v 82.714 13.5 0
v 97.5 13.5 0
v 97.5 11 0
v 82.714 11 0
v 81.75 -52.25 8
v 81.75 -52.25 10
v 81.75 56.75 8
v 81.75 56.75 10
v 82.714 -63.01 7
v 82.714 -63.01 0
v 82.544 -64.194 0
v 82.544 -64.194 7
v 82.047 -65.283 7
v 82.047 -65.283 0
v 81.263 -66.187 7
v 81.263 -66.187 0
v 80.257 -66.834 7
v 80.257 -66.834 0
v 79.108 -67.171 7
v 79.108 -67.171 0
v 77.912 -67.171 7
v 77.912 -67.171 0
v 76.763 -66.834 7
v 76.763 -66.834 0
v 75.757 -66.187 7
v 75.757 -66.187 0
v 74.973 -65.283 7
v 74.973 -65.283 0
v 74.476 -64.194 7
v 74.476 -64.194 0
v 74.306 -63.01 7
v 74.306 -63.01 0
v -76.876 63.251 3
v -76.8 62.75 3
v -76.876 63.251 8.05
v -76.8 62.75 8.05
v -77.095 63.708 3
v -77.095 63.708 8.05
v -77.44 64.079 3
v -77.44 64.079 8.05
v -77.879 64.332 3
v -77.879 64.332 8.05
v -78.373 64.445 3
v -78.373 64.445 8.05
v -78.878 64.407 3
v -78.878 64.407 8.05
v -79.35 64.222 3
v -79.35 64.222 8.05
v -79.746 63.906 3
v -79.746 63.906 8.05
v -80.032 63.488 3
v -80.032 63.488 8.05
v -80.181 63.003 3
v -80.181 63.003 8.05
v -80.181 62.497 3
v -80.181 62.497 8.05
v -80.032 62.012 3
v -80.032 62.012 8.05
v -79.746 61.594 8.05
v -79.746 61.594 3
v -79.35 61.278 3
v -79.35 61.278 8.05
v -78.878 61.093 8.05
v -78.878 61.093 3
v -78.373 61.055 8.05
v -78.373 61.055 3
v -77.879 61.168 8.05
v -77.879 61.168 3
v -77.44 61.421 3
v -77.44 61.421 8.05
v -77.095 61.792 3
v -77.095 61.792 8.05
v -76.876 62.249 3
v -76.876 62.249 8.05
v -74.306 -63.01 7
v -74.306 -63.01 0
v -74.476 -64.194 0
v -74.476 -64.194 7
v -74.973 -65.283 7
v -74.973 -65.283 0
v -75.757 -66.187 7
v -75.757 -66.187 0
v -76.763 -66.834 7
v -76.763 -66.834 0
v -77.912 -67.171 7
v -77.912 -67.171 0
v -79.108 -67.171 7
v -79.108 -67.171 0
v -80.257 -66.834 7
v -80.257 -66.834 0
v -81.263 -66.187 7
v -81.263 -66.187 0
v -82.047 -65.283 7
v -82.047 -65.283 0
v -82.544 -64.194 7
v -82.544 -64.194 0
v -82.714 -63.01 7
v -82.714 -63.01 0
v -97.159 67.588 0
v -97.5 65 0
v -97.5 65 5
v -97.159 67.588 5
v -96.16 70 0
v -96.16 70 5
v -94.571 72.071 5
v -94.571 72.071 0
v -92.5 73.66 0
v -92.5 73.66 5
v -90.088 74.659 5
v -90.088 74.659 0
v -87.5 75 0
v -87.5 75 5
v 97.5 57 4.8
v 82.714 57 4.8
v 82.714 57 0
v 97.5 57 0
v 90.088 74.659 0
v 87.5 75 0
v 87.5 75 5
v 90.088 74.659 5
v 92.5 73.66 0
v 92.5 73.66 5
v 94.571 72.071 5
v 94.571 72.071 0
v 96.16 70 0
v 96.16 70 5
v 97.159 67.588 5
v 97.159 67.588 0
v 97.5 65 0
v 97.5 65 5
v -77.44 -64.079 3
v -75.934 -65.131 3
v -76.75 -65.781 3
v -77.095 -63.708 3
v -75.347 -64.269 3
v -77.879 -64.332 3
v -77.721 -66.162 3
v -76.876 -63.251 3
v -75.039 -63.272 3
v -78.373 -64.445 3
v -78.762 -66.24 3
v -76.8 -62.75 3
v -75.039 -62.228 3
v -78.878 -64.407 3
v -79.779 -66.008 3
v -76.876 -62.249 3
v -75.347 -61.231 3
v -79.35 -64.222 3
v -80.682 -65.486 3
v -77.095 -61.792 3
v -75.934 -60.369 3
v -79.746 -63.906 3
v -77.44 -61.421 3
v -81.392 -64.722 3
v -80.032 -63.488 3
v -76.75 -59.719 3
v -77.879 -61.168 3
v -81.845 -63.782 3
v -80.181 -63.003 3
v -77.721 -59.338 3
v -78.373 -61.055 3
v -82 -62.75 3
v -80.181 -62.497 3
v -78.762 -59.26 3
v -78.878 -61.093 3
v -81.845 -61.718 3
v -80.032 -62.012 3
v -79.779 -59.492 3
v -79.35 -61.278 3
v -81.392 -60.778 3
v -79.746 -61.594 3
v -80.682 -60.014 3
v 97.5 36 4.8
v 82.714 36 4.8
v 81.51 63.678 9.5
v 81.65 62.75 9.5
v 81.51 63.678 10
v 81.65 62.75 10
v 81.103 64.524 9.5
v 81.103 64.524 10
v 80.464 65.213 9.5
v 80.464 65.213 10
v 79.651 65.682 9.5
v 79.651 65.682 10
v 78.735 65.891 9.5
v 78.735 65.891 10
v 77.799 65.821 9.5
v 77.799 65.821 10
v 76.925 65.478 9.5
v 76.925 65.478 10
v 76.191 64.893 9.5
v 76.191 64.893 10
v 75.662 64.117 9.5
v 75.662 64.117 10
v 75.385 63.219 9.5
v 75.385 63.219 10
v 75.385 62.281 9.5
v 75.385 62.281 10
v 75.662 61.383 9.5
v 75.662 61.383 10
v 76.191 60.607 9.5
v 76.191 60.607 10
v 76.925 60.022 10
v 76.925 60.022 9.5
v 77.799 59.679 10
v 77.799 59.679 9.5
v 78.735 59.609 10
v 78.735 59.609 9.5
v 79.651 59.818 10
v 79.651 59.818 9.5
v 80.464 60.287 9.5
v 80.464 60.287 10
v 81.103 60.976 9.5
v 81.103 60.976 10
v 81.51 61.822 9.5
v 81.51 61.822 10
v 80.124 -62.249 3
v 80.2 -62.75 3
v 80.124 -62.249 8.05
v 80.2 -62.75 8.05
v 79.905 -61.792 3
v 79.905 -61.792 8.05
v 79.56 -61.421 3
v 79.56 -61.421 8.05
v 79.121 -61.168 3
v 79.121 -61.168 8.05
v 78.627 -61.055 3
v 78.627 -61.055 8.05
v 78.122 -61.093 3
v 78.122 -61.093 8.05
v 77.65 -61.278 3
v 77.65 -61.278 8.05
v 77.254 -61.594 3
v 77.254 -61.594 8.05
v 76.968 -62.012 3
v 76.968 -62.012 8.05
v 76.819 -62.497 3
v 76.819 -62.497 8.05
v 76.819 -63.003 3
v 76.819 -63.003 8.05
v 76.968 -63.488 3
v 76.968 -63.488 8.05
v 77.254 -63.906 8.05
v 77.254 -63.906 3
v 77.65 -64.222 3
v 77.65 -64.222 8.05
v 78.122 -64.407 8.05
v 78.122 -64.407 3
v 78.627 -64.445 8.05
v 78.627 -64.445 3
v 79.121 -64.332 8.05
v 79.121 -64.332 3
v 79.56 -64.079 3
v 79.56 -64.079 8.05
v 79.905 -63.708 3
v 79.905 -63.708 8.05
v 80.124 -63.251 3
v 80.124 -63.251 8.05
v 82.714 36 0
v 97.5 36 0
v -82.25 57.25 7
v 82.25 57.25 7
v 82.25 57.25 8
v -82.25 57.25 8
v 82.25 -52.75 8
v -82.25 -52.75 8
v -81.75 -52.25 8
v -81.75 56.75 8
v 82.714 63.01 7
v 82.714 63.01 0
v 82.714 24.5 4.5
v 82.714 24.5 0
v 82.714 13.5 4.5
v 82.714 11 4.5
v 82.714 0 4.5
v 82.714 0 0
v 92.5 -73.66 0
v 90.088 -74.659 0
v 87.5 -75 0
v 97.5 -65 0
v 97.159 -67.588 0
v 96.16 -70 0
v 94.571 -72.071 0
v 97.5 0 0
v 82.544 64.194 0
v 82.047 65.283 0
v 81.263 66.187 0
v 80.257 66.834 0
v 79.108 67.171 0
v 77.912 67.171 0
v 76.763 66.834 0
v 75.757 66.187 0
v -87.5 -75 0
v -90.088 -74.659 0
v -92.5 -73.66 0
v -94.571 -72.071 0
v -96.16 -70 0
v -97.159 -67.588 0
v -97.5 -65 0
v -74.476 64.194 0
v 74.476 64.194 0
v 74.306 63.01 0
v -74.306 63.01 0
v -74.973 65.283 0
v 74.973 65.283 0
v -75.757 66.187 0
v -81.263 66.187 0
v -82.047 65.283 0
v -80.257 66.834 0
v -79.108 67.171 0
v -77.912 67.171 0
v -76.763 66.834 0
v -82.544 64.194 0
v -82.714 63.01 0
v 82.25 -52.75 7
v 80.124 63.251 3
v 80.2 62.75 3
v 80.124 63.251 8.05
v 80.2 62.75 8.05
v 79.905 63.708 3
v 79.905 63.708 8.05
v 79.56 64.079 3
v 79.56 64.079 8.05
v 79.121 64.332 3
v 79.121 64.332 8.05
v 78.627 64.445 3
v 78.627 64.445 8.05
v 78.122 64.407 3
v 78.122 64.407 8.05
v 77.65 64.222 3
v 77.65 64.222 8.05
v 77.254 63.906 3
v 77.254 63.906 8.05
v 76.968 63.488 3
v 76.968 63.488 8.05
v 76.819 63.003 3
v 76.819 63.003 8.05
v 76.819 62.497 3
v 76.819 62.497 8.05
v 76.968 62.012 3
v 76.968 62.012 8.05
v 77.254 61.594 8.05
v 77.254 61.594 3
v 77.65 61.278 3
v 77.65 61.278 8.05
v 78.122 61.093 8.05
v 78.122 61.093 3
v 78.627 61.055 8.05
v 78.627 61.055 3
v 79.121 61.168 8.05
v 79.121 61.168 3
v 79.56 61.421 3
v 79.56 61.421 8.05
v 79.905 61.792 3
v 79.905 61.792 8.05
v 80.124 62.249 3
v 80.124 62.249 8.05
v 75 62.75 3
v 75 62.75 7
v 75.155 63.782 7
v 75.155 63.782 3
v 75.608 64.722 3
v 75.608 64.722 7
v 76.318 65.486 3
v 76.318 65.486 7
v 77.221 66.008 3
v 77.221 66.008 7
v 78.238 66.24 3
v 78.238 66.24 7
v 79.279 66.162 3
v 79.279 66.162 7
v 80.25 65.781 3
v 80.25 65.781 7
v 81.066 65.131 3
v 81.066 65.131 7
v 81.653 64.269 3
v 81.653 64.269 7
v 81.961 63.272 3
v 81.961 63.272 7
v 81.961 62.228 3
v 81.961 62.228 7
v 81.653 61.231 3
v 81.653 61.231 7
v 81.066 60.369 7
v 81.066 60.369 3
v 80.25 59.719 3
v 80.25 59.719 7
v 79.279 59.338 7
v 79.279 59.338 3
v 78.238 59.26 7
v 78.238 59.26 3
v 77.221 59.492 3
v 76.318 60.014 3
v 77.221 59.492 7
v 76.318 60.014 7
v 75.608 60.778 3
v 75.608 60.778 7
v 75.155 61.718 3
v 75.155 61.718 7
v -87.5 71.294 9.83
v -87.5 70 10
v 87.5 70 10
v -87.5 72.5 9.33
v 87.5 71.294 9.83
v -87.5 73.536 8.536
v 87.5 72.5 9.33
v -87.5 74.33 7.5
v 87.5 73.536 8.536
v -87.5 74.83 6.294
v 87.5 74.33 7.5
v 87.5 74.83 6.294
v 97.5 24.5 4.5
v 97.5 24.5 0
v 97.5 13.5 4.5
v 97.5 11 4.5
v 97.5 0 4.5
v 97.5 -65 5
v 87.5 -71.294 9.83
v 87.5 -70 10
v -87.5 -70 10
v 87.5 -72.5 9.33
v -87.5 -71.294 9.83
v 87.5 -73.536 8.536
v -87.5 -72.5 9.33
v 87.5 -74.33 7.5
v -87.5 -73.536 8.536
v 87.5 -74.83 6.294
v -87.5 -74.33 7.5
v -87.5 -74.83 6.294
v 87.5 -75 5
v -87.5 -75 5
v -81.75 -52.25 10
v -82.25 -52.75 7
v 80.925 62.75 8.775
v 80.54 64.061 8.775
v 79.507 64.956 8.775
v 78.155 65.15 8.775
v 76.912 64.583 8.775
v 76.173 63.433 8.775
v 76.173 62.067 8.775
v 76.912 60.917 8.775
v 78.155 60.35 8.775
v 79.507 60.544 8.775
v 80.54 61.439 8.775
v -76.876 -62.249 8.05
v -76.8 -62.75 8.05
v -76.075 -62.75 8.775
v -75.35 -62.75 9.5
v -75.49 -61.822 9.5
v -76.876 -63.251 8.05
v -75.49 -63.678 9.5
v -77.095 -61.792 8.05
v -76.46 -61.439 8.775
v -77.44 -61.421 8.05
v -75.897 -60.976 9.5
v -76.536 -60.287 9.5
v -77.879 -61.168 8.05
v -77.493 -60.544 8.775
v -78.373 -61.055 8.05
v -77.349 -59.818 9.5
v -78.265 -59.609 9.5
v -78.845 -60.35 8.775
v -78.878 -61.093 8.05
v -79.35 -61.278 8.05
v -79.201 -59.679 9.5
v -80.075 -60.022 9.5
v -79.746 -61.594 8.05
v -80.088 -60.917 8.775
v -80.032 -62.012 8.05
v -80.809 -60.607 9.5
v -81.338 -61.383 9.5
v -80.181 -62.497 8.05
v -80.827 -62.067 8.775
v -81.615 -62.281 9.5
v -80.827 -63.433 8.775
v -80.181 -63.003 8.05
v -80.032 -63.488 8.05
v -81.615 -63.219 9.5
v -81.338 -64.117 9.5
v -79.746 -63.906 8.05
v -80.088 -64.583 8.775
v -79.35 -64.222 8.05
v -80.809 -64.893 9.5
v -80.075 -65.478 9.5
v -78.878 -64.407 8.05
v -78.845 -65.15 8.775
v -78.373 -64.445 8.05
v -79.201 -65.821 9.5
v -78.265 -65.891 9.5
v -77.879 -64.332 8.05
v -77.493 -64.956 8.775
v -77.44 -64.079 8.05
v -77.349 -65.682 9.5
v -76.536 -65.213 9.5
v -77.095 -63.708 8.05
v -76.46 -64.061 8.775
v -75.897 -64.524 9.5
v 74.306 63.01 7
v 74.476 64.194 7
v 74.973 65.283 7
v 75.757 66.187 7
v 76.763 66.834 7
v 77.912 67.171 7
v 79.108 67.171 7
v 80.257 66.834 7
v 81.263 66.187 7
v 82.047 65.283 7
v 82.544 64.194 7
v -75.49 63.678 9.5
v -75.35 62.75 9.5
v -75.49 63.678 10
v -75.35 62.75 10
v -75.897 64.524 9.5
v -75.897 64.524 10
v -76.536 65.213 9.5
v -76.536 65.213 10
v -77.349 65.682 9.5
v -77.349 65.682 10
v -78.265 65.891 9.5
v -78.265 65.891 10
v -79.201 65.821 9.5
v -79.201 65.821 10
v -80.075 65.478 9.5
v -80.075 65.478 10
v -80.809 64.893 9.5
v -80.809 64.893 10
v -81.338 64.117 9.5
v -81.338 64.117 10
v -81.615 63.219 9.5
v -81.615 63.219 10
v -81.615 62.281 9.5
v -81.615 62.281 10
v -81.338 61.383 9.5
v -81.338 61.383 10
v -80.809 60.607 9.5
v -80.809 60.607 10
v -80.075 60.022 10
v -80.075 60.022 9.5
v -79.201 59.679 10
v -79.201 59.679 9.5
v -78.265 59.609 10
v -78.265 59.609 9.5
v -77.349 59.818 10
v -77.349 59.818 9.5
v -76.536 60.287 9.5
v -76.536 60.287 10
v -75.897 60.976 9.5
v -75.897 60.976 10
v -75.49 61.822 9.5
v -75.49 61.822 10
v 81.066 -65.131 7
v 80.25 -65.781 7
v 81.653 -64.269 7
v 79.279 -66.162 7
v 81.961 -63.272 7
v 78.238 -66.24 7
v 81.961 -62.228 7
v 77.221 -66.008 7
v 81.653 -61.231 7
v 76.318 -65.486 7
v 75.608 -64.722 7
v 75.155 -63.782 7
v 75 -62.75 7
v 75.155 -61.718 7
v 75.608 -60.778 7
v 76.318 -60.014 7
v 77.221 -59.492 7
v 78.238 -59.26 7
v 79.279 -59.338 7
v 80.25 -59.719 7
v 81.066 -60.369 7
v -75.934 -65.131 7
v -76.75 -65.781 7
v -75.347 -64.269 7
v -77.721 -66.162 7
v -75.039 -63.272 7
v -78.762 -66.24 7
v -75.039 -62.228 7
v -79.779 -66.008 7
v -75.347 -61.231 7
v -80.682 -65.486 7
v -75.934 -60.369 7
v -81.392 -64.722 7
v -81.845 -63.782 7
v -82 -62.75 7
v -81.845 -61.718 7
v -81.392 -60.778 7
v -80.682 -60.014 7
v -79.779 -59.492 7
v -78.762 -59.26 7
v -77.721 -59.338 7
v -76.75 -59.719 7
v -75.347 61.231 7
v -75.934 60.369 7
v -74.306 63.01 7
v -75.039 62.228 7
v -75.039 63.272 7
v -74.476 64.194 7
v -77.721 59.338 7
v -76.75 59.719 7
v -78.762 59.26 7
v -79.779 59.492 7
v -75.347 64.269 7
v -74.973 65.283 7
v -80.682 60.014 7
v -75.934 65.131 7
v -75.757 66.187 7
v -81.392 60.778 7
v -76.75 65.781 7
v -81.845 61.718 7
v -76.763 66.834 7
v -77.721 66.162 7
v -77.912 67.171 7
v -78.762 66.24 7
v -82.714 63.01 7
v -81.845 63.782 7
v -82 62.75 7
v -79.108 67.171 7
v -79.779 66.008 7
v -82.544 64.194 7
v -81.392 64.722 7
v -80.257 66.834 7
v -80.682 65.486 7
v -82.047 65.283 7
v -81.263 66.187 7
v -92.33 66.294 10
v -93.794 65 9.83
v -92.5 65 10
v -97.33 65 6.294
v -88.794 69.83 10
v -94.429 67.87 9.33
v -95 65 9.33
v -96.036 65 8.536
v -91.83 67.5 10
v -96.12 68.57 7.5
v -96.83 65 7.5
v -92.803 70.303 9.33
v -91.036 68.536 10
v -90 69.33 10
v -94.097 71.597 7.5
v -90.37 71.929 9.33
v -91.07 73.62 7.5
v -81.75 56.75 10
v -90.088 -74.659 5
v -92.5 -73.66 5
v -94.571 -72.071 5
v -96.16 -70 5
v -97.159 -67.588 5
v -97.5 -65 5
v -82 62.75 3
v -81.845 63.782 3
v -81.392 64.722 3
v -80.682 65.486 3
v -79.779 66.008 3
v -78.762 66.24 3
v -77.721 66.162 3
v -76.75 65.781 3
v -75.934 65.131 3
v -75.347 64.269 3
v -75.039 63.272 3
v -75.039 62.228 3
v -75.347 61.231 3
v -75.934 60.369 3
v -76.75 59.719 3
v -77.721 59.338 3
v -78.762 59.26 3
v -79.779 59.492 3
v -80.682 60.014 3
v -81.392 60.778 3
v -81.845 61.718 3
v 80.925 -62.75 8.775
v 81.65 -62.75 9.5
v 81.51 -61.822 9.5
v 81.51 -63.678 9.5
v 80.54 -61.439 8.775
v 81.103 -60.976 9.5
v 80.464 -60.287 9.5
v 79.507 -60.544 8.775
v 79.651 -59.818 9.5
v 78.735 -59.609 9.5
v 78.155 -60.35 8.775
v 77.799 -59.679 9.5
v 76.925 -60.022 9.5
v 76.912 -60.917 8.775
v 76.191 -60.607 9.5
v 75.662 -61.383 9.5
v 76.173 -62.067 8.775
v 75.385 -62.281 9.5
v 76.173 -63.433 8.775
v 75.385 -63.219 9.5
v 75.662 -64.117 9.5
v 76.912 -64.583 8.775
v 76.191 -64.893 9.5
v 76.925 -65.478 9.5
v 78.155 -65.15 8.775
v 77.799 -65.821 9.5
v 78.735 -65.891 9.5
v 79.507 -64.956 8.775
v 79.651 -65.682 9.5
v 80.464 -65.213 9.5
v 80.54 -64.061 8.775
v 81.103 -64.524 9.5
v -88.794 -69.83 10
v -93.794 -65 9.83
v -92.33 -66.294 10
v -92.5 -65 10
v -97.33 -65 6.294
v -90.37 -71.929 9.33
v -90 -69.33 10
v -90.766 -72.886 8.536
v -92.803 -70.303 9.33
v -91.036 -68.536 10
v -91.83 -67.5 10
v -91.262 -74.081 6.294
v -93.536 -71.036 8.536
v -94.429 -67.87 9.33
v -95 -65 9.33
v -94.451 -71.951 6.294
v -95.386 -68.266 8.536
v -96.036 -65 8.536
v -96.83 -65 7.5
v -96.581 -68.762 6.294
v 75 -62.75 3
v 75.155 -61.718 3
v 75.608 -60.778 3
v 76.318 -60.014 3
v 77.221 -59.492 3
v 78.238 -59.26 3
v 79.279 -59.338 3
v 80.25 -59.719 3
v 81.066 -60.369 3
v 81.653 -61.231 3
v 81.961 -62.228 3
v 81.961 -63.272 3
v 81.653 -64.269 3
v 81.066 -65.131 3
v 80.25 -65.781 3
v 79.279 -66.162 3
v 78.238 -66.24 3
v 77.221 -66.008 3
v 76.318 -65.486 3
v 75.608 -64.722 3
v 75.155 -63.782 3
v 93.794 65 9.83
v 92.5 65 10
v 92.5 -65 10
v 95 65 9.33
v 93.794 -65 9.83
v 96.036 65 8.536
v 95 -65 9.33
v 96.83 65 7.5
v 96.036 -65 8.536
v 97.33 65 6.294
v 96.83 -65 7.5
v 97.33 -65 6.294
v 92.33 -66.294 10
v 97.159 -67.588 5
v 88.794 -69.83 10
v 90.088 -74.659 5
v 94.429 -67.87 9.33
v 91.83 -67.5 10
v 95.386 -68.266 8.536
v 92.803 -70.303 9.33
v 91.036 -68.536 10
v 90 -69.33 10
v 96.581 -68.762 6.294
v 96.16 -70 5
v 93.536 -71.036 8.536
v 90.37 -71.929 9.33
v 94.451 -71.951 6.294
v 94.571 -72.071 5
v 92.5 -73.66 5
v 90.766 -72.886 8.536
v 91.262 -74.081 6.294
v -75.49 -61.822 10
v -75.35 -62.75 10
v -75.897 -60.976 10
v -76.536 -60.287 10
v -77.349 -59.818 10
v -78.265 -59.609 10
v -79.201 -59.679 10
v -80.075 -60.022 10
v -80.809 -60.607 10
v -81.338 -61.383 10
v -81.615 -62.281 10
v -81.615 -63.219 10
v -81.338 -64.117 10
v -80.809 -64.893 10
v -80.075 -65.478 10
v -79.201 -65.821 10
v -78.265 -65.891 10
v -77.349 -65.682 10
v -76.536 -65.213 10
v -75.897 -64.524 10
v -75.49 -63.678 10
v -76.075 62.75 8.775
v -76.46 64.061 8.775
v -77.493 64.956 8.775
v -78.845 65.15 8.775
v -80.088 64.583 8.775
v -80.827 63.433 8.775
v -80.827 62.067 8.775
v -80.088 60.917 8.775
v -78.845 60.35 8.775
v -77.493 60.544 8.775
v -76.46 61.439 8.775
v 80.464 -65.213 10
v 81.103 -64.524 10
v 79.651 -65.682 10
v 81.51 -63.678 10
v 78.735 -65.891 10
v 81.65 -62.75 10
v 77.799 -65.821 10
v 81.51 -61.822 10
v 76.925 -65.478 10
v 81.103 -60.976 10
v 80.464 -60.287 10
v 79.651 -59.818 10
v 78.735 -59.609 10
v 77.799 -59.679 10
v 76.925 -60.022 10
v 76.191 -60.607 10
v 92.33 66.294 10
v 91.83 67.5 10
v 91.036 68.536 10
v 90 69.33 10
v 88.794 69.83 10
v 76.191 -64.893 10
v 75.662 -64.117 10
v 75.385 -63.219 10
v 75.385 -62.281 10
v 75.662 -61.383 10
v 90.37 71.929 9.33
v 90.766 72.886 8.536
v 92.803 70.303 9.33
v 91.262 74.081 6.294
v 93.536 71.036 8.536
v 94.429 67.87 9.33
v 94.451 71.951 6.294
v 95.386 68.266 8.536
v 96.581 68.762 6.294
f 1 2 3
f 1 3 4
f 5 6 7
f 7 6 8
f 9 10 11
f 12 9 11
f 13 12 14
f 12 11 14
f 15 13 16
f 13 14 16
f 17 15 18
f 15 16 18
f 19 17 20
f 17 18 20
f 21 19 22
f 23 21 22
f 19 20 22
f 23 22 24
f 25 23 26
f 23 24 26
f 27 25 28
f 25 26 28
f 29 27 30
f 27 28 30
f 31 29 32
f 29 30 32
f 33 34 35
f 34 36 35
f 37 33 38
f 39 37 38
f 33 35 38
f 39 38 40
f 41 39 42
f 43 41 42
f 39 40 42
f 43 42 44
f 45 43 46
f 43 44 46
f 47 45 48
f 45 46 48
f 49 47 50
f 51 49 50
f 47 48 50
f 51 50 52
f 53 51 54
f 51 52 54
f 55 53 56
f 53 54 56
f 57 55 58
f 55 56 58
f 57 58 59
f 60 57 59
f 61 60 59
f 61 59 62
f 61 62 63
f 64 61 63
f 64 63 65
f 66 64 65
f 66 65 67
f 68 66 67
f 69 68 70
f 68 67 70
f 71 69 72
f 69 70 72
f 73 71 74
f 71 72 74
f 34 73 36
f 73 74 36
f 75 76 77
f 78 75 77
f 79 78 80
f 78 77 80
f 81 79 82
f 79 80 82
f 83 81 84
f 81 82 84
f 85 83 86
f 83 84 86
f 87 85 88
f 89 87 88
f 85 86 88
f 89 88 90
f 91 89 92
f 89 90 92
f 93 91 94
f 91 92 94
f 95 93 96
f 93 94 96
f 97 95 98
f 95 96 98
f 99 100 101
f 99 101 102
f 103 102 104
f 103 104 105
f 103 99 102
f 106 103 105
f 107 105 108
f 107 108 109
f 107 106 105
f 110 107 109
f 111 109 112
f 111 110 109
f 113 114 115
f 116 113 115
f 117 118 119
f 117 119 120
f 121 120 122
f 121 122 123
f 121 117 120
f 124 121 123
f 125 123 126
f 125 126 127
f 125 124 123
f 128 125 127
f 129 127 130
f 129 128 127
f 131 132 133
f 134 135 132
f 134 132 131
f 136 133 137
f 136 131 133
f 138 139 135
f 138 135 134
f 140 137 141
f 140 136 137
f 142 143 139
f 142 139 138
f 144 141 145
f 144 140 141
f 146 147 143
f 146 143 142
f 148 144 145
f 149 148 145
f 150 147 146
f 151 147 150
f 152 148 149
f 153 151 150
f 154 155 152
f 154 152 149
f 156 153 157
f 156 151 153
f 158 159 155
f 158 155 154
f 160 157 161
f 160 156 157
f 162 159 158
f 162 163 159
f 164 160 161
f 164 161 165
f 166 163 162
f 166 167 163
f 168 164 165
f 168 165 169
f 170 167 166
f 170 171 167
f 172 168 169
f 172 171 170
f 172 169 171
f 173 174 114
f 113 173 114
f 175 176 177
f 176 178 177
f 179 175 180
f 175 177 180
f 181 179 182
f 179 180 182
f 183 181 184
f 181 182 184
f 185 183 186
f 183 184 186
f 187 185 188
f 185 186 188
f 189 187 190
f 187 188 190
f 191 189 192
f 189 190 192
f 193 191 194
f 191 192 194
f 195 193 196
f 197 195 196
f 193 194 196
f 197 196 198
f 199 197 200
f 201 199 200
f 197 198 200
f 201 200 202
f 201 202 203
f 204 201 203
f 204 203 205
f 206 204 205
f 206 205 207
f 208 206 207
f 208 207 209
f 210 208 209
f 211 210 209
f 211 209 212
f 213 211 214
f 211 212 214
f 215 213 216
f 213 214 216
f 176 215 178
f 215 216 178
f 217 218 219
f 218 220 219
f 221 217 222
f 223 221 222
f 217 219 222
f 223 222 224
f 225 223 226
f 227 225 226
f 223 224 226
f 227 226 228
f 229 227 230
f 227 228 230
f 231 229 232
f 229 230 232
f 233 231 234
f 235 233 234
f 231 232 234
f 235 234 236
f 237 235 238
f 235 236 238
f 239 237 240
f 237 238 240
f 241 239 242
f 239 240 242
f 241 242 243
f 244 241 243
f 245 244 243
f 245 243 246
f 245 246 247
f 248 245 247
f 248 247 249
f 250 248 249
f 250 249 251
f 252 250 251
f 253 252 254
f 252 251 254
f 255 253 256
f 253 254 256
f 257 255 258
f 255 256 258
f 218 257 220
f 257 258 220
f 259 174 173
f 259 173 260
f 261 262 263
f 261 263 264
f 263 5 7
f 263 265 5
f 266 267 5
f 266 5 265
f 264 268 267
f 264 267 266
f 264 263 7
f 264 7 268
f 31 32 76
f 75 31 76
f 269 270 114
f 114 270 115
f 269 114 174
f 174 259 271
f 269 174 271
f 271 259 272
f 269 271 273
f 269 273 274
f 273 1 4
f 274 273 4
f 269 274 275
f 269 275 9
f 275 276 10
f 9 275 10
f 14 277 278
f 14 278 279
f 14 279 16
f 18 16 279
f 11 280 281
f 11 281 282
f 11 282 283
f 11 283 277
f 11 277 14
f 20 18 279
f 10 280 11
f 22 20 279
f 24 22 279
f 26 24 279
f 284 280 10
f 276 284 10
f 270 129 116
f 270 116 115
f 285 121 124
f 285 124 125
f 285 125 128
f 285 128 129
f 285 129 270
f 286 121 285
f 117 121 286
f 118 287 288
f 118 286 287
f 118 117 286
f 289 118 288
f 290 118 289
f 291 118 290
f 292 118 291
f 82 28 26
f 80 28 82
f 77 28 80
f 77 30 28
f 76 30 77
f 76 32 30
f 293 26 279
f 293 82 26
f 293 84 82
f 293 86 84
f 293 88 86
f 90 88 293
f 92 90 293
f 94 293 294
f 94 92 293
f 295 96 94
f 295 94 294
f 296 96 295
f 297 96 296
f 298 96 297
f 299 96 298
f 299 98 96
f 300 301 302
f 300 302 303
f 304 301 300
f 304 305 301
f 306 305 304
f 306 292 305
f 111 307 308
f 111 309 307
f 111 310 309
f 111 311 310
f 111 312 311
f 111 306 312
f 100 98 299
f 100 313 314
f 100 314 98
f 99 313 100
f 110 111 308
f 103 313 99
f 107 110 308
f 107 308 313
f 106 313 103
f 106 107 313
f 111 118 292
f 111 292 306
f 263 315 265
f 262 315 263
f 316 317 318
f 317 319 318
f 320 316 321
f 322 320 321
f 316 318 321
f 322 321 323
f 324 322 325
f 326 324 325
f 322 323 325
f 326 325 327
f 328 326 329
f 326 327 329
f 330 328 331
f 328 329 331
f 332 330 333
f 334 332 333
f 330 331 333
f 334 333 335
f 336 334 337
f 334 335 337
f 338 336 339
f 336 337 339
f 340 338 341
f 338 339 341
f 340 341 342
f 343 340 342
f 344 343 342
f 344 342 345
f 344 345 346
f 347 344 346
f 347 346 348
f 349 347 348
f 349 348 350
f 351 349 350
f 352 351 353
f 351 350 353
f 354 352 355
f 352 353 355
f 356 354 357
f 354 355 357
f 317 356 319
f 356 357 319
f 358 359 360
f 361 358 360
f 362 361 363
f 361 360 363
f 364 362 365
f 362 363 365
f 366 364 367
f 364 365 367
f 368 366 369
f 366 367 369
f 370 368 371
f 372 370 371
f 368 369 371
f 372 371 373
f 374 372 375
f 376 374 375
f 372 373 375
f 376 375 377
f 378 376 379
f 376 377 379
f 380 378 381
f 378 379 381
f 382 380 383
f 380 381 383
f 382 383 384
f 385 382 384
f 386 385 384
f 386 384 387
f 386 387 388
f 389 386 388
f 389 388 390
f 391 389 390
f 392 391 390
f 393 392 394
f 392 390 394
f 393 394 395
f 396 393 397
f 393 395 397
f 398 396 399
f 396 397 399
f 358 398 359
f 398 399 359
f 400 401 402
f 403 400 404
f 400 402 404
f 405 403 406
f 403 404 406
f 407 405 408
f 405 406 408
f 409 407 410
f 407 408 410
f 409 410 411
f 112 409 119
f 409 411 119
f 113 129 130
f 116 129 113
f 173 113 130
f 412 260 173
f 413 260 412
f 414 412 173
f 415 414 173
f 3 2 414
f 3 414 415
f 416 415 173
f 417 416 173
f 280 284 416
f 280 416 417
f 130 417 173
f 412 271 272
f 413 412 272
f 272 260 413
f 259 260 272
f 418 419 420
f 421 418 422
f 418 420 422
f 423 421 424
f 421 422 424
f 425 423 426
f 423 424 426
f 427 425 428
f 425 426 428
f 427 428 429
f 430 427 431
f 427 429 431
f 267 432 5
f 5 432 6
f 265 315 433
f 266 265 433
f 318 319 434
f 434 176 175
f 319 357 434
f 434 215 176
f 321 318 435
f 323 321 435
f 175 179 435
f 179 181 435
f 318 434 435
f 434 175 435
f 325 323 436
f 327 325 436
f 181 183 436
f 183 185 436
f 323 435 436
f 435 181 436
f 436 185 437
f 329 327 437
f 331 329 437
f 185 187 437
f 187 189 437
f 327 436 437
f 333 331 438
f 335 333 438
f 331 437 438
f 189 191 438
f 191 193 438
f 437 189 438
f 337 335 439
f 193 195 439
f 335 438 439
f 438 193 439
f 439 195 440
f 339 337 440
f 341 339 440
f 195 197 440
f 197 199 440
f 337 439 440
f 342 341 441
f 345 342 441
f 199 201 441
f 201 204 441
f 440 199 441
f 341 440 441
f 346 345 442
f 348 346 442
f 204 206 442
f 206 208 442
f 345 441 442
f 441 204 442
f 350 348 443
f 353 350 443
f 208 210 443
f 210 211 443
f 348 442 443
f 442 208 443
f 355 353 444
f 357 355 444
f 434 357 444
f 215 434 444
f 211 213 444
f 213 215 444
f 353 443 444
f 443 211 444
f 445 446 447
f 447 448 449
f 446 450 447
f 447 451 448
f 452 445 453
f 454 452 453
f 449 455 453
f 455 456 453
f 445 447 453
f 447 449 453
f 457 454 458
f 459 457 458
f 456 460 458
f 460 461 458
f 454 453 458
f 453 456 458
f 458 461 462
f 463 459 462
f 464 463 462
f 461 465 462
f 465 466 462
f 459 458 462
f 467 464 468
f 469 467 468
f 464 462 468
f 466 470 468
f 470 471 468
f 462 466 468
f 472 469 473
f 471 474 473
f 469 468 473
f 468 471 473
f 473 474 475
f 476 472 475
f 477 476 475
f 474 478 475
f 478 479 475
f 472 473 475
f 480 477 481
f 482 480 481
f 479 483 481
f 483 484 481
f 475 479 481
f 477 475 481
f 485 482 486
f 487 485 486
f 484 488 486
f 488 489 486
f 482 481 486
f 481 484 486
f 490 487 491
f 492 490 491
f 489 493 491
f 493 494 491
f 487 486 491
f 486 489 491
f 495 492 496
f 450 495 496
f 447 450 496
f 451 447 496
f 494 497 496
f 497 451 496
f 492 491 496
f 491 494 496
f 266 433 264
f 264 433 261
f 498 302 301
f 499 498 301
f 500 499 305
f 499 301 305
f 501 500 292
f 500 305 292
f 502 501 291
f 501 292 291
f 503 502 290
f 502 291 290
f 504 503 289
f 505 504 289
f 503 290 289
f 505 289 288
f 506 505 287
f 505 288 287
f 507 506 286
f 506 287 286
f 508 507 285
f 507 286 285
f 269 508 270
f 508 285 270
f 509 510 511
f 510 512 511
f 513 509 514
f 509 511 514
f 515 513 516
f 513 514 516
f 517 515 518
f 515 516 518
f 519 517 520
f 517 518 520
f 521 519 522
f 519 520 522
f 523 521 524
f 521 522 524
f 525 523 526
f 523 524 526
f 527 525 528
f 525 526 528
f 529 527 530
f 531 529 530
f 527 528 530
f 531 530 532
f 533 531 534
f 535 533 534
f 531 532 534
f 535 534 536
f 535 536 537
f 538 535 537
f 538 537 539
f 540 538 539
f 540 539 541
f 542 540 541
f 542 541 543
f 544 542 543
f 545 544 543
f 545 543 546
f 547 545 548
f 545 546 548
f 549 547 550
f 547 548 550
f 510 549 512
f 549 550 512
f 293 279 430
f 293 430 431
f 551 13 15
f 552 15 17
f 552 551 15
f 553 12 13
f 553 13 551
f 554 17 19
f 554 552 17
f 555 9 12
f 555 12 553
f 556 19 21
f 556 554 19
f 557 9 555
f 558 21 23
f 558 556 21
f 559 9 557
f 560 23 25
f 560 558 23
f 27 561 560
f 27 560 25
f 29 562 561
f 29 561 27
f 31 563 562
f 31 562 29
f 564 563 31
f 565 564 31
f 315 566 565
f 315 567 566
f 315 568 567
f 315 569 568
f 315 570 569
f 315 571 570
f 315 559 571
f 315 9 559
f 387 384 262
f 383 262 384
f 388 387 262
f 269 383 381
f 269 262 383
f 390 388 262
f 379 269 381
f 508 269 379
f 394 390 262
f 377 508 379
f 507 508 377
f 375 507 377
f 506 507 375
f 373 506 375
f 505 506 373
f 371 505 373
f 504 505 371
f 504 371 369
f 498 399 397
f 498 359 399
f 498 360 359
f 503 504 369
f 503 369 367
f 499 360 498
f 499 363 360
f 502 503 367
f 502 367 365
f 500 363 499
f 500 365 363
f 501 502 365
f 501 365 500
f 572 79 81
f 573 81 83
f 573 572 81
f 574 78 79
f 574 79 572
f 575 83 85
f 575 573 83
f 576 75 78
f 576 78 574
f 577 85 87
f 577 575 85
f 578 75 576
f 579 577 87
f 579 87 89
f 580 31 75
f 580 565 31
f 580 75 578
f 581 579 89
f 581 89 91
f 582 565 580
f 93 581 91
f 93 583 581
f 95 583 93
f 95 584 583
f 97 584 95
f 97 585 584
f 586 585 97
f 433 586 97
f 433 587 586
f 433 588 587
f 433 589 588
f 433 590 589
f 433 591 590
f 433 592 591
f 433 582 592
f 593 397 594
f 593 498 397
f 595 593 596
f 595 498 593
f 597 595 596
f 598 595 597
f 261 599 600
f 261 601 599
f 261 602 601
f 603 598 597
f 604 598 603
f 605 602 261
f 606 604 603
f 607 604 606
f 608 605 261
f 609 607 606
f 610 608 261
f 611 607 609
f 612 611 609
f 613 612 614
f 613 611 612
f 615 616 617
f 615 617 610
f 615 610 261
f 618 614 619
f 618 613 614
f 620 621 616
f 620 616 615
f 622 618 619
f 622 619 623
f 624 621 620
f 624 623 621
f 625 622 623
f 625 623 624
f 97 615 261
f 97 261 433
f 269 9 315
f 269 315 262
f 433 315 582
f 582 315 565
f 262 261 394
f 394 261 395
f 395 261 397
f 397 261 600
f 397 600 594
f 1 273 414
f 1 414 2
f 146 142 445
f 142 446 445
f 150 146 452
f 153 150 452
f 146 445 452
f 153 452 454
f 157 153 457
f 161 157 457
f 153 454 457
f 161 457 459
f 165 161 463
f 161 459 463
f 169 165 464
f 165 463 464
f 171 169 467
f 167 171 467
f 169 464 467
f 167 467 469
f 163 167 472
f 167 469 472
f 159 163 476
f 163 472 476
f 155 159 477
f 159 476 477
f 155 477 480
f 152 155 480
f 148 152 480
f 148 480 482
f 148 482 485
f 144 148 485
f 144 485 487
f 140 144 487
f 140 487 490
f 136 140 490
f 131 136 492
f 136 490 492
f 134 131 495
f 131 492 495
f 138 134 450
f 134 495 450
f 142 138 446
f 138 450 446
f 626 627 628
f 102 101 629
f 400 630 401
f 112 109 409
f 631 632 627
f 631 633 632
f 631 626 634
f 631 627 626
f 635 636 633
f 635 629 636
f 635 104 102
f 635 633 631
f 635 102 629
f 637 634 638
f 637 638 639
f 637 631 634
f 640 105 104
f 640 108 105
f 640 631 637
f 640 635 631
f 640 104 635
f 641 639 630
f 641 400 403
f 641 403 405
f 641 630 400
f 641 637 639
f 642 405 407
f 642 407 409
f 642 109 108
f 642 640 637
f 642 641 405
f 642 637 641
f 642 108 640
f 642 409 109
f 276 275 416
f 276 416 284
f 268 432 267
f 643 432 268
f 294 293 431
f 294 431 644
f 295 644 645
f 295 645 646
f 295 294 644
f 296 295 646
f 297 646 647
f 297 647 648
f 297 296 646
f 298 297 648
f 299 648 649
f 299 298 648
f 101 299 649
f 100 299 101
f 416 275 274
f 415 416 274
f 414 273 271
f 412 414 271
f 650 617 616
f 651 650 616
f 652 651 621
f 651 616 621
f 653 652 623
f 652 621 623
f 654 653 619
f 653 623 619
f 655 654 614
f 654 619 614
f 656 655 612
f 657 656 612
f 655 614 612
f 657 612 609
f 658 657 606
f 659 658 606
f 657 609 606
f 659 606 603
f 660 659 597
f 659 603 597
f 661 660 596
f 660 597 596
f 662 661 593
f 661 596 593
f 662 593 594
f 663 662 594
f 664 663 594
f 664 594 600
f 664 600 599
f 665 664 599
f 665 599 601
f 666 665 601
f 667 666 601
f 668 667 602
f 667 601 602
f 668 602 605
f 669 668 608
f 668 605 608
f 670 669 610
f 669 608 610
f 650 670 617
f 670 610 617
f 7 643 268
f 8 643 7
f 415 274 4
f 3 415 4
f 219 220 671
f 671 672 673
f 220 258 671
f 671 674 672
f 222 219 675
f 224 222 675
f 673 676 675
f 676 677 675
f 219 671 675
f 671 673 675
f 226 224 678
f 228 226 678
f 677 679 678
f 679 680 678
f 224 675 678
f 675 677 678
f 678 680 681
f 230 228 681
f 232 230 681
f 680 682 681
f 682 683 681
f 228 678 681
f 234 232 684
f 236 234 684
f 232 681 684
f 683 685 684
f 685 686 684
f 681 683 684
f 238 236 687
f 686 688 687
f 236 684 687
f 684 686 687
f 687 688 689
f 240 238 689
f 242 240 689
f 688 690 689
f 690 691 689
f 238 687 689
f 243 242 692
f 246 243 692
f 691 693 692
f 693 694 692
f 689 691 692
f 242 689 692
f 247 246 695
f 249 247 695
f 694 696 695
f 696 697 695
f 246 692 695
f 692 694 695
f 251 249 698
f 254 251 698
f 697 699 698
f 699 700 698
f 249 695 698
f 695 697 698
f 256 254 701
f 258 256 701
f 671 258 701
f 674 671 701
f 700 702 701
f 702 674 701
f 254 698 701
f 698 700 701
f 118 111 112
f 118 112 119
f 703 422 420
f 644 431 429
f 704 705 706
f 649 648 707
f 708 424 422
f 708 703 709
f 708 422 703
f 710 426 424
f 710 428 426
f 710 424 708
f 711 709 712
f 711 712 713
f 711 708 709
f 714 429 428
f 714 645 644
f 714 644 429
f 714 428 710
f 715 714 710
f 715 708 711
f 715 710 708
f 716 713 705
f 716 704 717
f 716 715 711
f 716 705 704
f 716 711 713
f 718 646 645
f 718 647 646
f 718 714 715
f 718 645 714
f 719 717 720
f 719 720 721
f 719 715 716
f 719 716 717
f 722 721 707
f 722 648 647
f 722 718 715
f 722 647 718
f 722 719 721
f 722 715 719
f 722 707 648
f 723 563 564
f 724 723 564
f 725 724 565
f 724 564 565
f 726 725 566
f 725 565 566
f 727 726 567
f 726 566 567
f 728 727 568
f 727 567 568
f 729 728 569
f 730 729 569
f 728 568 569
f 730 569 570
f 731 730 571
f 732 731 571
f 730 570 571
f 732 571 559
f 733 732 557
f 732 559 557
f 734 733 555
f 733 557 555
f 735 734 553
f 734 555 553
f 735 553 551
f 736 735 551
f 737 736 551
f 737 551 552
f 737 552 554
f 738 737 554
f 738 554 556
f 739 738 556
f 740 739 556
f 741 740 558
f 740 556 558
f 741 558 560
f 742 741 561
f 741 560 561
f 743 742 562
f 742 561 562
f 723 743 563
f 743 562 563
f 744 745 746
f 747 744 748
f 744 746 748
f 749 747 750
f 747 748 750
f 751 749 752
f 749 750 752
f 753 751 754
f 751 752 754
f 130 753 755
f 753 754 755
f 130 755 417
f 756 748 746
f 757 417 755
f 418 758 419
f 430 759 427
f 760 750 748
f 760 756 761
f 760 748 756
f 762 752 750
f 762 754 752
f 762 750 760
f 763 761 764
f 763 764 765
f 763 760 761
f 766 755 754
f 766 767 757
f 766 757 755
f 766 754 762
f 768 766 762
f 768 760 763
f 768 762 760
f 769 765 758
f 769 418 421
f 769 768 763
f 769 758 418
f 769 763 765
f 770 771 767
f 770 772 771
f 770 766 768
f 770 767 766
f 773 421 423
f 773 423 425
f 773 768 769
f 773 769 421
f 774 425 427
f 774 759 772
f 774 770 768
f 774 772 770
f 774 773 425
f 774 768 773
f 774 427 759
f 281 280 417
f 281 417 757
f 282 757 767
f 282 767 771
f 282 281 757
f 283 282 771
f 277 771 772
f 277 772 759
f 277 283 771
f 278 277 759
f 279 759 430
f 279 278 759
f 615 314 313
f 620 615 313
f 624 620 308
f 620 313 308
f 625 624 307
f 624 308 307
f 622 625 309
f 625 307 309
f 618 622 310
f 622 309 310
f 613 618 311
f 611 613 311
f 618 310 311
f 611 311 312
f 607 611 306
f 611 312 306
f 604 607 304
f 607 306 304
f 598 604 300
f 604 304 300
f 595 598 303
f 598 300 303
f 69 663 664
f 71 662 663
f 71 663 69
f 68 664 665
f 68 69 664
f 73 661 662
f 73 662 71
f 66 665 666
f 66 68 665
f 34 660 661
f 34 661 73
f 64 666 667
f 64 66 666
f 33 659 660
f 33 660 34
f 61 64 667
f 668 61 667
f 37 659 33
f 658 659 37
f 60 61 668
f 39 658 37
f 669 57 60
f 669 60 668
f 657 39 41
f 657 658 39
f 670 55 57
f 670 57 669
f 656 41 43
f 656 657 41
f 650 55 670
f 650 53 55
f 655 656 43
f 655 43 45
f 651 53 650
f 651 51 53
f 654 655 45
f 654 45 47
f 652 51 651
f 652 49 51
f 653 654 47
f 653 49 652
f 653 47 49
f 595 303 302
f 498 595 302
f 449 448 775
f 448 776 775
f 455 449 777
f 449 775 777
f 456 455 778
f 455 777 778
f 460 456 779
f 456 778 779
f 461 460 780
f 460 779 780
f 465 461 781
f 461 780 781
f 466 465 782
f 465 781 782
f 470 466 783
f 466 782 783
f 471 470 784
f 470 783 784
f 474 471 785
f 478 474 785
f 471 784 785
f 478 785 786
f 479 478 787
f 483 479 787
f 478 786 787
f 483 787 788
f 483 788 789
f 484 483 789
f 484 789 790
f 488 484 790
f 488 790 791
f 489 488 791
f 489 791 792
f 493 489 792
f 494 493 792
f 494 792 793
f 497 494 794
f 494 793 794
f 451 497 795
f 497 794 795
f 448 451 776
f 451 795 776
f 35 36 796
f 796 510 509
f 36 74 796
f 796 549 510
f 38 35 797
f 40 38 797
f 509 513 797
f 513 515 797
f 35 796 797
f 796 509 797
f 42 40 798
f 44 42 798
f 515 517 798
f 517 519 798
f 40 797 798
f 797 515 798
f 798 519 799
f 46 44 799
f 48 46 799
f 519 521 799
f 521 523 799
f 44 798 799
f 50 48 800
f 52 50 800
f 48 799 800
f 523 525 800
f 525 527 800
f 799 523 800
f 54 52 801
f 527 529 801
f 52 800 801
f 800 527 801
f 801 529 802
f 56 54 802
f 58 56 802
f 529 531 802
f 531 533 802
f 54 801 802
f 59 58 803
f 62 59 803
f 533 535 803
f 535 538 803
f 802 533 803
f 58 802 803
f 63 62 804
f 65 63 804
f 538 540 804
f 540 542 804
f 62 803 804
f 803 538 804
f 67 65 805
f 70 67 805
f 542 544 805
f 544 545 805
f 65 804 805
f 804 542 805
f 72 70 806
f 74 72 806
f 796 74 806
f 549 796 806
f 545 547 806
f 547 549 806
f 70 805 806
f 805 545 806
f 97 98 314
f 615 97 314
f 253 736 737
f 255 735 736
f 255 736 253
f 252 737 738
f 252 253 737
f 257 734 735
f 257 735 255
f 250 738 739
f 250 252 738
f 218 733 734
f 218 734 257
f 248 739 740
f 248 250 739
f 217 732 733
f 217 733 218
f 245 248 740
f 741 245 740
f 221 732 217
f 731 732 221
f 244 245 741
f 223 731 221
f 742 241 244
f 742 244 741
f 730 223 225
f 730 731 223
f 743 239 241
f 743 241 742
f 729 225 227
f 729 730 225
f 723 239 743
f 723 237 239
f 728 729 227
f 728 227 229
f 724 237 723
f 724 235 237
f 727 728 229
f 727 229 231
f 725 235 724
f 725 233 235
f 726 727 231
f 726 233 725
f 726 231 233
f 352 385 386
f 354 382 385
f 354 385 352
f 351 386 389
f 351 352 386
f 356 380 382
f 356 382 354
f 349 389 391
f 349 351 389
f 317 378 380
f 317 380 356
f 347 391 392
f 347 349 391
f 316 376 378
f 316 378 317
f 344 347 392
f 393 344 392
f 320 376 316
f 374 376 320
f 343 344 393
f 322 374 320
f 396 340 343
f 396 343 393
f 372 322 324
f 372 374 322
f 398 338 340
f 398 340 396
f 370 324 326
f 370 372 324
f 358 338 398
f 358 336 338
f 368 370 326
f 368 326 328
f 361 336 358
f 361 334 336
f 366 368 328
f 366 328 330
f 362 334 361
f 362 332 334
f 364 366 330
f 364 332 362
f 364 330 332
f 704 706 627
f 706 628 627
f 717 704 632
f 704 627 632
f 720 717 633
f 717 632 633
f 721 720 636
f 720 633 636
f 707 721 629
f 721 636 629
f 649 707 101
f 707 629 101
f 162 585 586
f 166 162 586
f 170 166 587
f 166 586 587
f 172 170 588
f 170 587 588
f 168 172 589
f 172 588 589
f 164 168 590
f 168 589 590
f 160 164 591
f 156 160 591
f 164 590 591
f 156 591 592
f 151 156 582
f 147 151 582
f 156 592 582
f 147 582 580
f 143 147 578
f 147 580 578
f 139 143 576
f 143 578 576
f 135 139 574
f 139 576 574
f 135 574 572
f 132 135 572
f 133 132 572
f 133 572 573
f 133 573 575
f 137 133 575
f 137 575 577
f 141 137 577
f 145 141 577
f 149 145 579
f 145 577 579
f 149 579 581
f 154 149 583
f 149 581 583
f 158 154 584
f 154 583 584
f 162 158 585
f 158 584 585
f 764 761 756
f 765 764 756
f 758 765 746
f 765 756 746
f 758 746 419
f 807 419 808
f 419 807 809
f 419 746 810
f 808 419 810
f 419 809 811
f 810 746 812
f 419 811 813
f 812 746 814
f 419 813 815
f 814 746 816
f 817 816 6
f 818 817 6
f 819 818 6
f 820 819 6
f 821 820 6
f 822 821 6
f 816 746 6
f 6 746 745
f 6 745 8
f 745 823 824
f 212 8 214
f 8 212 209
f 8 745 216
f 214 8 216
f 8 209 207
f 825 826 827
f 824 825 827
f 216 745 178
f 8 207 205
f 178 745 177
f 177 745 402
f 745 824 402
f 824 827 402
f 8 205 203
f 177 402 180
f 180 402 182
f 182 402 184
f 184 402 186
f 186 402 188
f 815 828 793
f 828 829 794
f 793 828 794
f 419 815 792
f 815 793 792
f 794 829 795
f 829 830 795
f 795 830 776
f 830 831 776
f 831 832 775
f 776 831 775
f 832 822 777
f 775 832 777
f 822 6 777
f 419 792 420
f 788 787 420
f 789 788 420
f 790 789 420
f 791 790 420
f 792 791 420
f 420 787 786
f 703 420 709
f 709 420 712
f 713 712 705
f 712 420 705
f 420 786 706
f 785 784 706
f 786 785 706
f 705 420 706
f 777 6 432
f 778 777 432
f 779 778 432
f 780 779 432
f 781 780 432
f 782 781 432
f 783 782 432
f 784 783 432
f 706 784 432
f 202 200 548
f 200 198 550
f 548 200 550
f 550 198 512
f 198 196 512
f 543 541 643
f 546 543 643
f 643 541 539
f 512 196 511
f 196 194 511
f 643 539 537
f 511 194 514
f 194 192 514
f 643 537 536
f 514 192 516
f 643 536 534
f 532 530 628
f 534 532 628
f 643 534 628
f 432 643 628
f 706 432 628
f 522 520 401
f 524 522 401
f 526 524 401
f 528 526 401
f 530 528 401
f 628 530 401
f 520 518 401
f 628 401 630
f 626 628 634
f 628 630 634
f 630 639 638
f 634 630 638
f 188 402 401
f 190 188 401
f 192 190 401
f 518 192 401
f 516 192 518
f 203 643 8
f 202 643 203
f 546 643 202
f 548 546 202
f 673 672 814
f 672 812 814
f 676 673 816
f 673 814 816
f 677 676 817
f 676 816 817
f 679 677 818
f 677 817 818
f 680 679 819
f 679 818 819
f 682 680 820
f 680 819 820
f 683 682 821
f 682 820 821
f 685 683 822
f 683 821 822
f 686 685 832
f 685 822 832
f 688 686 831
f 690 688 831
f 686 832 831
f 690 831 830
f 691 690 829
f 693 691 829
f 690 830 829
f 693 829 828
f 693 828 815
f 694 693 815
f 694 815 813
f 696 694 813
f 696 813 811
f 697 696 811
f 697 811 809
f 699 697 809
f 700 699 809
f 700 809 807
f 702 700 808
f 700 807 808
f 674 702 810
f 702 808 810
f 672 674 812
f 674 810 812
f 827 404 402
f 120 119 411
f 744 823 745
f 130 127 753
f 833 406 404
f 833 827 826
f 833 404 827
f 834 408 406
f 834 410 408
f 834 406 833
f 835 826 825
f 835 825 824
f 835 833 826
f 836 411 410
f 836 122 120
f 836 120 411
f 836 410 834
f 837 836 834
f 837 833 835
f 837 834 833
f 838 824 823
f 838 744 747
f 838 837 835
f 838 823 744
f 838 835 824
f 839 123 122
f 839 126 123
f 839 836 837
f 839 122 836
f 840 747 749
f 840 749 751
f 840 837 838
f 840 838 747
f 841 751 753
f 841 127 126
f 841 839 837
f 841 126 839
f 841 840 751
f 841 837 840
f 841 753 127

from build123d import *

# Parameters (mm, degrees)
BOSS_EXTRU_1_DEPTH      = 10
ESQUISSE2_W             = 163.5
ESQUISSE2_H             = 109
ENL_V_MAT_EXTRU_1_DEPTH = 10
ESQUISSE3_W             = 164.5
ESQUISSE3_H             = 110
ENL_V_MAT_EXTRU_2_DEPTH = 8
ENL_V_MAT_EXTRU_3_DEPTH = 7
ESQUISSE5_R             = 3.5
BOSS_EXTRU_2_DEPTH      = 4
CONG_1_R                = 5
ESQUISSE6_W             = 12.13
ESQUISSE6_H             = 21
ESQUISSE6_W_2           = 8
ESQUISSE6_H_2           = 11
ENL_V_MAT_EXTRU_4_DEPTH = 97.5


# Read off the part's stored shape, not the designer's step: Fraisage pour vis à tête fraisée M31
with BuildPart() as part:
    # Esquisse1 → Boss.-Extru.1 (new body)
    with BuildSketch(Plane.XY):
        with BuildLine():
            Line((87.5, -75), (-87.5, -75))
            ThreePointArc((-87.5, -75), (-94.571067812, -72.071067812), (-97.5, -65))
            Line((-97.5, -65), (-97.5, 65))
            ThreePointArc((-97.5, 65), (-94.571067812, 72.071067812), (-87.5, 75))
            Line((-87.5, 75), (87.5, 75))
            ThreePointArc((87.5, 75), (94.571067812, 72.071067812), (97.5, 65))
            Line((97.5, 65), (97.5, -65))
            ThreePointArc((97.5, -65), (94.571067812, -72.071067812), (87.5, -75))
        make_face()
    extrude(amount=BOSS_EXTRU_1_DEPTH)

    # Esquisse2 → Enlèv. mat.-Extru.1 (cut)
    with BuildSketch(Plane.XY.offset(10)):
        with Locations((0, 2.25)):
            Rectangle(ESQUISSE2_W, ESQUISSE2_H)
    extrude(amount=-ENL_V_MAT_EXTRU_1_DEPTH, mode=Mode.SUBTRACT)

    # Esquisse3 → Enlèv. mat.-Extru.2 (cut)
    with BuildSketch(Plane(origin=(0, 0, 0), x_dir=(-1, 0, 0), z_dir=(0, 0, -1))):
        with Locations((0, 2.25)):
            Rectangle(ESQUISSE3_W, ESQUISSE3_H)
    extrude(amount=-ENL_V_MAT_EXTRU_2_DEPTH, mode=Mode.SUBTRACT)

    # Esquisse4 → Enlèv. mat.-Extru.3 (cut)
    with BuildSketch(Plane(origin=(0, 0, 0), x_dir=(-1, 0, 0), z_dir=(0, 0, -1))):
        with BuildLine():
            Line((-74.305753882, -63.01), (74.305753882, -63.01))
            ThreePointArc((74.305753882, -63.01), (78.51, -67.214246118), (82.714246118, -63.01))
            Line((82.714246118, -63.01), (82.714246118, 63.01))
            ThreePointArc((82.714246118, 63.01), (78.51, 67.214246118), (74.305753882, 63.01))
            Line((74.305753882, 63.01), (-74.305753882, 63.01))
            ThreePointArc((-74.305753882, 63.01), (-78.51, 67.214246118), (-82.714246118, 63.01))
            Line((-82.714246118, 63.01), (-82.714246118, -63.01))
            ThreePointArc((-82.714246118, -63.01), (-78.51, -67.214246118), (-74.305753882, -63.01))
        make_face()
    extrude(amount=-ENL_V_MAT_EXTRU_3_DEPTH, mode=Mode.SUBTRACT)

    # Esquisse5 → Boss.-Extru.2 (add)
    with BuildSketch(Plane(origin=(0, 0, 7), x_dir=(-1, 0, 0), z_dir=(0, 0, -1))):
        with Locations((-78.5, -62.75)):
            Circle(ESQUISSE5_R)
        with Locations((78.5, -62.75)):
            Circle(ESQUISSE5_R)
        with Locations((78.5, 62.75)):
            Circle(ESQUISSE5_R)
        with Locations((-78.5, 62.75)):
            Circle(ESQUISSE5_R)
    extrude(amount=BOSS_EXTRU_2_DEPTH)

    # Congé1
    cong_1_edges = [part.edges().sort_by_distance(p)[0] for p in [
        (-94.571067812, 72.071067812, 10),
        (-97.5, 0, 10),
        (-94.571067812, -72.071067812, 10),
        (0, -75, 10),
        (94.571067812, -72.071067812, 10),
        (97.5, 0, 10),
        (94.571067812, 72.071067812, 10),
        (0, 75, 10),
    ]]
    fillet(cong_1_edges, radius=CONG_1_R)

    # Esquisse6 → Enlèv. mat.-Extru.4 (cut)
    with BuildSketch(Plane(origin=(0, 0, 0), x_dir=(0, 0, -1), z_dir=(1, 0, 0))):
        with Locations((1.265, 46.5)):
            Rectangle(ESQUISSE6_W, ESQUISSE6_H)
        with Locations((-0.5, 19)):
            Rectangle(ESQUISSE6_W_2, ESQUISSE6_H_2)
        with Locations((-0.5, 5.5)):
            Rectangle(ESQUISSE6_W_2, ESQUISSE6_H_2)
    extrude(amount=ENL_V_MAT_EXTRU_4_DEPTH, mode=Mode.SUBTRACT)

    # Fraisage pour vis à tête fraisée M31 out → Fraisage pour vis à tête fraisée M31 (revolve, cut)
    with BuildSketch(Plane(origin=(-78.5, -62.75, 0), x_dir=(1, 0, 0), z_dir=(0, -1, 0))):
        Polygon((0, 3), (1.7, 3), (1.7, 8.05), (3.15, 9.5), (3.15, 10), (0, 10), align=None)
    revolve(axis=Axis((-78.5, -62.75, 0), (0, 0, 1)), mode=Mode.SUBTRACT)

    # Fraisage pour vis _ t_te frais_e M31 2 o → Fraisage pour vis _ t_te frais_e M31 2 (revolve, cut)
    with BuildSketch(Plane(origin=(78.5, -62.75, 0), x_dir=(1, 0, 0), z_dir=(0, -1, 0))):
        Polygon((0, 3), (1.7, 3), (1.7, 8.05), (3.15, 9.5), (3.15, 10), (0, 10), align=None)
    revolve(axis=Axis((78.5, -62.75, 0), (0, 0, 1)), mode=Mode.SUBTRACT)

    # Fraisage pour vis _ t_te frais_e M31 3 o → Fraisage pour vis _ t_te frais_e M31 3 (revolve, cut)
    with BuildSketch(Plane(origin=(78.5, 62.75, 0), x_dir=(1, 0, 0), z_dir=(0, -1, 0))):
        Polygon((0, 3), (1.7, 3), (1.7, 8.05), (3.15, 9.5), (3.15, 10), (0, 10), align=None)
    revolve(axis=Axis((78.5, 62.75, 0), (0, 0, 1)), mode=Mode.SUBTRACT)

    # Fraisage pour vis _ t_te frais_e M31 4 o → Fraisage pour vis _ t_te frais_e M31 4 (revolve, cut)
    with BuildSketch(Plane(origin=(-78.5, 62.75, 0), x_dir=(1, 0, 0), z_dir=(0, -1, 0))):
        Polygon((0, 3), (1.7, 3), (1.7, 8.05), (3.15, 9.5), (3.15, 10), (0, 10), align=None)
    revolve(axis=Axis((-78.5, 62.75, 0), (0, 0, 1)), mode=Mode.SUBTRACT)


solid = part.part
